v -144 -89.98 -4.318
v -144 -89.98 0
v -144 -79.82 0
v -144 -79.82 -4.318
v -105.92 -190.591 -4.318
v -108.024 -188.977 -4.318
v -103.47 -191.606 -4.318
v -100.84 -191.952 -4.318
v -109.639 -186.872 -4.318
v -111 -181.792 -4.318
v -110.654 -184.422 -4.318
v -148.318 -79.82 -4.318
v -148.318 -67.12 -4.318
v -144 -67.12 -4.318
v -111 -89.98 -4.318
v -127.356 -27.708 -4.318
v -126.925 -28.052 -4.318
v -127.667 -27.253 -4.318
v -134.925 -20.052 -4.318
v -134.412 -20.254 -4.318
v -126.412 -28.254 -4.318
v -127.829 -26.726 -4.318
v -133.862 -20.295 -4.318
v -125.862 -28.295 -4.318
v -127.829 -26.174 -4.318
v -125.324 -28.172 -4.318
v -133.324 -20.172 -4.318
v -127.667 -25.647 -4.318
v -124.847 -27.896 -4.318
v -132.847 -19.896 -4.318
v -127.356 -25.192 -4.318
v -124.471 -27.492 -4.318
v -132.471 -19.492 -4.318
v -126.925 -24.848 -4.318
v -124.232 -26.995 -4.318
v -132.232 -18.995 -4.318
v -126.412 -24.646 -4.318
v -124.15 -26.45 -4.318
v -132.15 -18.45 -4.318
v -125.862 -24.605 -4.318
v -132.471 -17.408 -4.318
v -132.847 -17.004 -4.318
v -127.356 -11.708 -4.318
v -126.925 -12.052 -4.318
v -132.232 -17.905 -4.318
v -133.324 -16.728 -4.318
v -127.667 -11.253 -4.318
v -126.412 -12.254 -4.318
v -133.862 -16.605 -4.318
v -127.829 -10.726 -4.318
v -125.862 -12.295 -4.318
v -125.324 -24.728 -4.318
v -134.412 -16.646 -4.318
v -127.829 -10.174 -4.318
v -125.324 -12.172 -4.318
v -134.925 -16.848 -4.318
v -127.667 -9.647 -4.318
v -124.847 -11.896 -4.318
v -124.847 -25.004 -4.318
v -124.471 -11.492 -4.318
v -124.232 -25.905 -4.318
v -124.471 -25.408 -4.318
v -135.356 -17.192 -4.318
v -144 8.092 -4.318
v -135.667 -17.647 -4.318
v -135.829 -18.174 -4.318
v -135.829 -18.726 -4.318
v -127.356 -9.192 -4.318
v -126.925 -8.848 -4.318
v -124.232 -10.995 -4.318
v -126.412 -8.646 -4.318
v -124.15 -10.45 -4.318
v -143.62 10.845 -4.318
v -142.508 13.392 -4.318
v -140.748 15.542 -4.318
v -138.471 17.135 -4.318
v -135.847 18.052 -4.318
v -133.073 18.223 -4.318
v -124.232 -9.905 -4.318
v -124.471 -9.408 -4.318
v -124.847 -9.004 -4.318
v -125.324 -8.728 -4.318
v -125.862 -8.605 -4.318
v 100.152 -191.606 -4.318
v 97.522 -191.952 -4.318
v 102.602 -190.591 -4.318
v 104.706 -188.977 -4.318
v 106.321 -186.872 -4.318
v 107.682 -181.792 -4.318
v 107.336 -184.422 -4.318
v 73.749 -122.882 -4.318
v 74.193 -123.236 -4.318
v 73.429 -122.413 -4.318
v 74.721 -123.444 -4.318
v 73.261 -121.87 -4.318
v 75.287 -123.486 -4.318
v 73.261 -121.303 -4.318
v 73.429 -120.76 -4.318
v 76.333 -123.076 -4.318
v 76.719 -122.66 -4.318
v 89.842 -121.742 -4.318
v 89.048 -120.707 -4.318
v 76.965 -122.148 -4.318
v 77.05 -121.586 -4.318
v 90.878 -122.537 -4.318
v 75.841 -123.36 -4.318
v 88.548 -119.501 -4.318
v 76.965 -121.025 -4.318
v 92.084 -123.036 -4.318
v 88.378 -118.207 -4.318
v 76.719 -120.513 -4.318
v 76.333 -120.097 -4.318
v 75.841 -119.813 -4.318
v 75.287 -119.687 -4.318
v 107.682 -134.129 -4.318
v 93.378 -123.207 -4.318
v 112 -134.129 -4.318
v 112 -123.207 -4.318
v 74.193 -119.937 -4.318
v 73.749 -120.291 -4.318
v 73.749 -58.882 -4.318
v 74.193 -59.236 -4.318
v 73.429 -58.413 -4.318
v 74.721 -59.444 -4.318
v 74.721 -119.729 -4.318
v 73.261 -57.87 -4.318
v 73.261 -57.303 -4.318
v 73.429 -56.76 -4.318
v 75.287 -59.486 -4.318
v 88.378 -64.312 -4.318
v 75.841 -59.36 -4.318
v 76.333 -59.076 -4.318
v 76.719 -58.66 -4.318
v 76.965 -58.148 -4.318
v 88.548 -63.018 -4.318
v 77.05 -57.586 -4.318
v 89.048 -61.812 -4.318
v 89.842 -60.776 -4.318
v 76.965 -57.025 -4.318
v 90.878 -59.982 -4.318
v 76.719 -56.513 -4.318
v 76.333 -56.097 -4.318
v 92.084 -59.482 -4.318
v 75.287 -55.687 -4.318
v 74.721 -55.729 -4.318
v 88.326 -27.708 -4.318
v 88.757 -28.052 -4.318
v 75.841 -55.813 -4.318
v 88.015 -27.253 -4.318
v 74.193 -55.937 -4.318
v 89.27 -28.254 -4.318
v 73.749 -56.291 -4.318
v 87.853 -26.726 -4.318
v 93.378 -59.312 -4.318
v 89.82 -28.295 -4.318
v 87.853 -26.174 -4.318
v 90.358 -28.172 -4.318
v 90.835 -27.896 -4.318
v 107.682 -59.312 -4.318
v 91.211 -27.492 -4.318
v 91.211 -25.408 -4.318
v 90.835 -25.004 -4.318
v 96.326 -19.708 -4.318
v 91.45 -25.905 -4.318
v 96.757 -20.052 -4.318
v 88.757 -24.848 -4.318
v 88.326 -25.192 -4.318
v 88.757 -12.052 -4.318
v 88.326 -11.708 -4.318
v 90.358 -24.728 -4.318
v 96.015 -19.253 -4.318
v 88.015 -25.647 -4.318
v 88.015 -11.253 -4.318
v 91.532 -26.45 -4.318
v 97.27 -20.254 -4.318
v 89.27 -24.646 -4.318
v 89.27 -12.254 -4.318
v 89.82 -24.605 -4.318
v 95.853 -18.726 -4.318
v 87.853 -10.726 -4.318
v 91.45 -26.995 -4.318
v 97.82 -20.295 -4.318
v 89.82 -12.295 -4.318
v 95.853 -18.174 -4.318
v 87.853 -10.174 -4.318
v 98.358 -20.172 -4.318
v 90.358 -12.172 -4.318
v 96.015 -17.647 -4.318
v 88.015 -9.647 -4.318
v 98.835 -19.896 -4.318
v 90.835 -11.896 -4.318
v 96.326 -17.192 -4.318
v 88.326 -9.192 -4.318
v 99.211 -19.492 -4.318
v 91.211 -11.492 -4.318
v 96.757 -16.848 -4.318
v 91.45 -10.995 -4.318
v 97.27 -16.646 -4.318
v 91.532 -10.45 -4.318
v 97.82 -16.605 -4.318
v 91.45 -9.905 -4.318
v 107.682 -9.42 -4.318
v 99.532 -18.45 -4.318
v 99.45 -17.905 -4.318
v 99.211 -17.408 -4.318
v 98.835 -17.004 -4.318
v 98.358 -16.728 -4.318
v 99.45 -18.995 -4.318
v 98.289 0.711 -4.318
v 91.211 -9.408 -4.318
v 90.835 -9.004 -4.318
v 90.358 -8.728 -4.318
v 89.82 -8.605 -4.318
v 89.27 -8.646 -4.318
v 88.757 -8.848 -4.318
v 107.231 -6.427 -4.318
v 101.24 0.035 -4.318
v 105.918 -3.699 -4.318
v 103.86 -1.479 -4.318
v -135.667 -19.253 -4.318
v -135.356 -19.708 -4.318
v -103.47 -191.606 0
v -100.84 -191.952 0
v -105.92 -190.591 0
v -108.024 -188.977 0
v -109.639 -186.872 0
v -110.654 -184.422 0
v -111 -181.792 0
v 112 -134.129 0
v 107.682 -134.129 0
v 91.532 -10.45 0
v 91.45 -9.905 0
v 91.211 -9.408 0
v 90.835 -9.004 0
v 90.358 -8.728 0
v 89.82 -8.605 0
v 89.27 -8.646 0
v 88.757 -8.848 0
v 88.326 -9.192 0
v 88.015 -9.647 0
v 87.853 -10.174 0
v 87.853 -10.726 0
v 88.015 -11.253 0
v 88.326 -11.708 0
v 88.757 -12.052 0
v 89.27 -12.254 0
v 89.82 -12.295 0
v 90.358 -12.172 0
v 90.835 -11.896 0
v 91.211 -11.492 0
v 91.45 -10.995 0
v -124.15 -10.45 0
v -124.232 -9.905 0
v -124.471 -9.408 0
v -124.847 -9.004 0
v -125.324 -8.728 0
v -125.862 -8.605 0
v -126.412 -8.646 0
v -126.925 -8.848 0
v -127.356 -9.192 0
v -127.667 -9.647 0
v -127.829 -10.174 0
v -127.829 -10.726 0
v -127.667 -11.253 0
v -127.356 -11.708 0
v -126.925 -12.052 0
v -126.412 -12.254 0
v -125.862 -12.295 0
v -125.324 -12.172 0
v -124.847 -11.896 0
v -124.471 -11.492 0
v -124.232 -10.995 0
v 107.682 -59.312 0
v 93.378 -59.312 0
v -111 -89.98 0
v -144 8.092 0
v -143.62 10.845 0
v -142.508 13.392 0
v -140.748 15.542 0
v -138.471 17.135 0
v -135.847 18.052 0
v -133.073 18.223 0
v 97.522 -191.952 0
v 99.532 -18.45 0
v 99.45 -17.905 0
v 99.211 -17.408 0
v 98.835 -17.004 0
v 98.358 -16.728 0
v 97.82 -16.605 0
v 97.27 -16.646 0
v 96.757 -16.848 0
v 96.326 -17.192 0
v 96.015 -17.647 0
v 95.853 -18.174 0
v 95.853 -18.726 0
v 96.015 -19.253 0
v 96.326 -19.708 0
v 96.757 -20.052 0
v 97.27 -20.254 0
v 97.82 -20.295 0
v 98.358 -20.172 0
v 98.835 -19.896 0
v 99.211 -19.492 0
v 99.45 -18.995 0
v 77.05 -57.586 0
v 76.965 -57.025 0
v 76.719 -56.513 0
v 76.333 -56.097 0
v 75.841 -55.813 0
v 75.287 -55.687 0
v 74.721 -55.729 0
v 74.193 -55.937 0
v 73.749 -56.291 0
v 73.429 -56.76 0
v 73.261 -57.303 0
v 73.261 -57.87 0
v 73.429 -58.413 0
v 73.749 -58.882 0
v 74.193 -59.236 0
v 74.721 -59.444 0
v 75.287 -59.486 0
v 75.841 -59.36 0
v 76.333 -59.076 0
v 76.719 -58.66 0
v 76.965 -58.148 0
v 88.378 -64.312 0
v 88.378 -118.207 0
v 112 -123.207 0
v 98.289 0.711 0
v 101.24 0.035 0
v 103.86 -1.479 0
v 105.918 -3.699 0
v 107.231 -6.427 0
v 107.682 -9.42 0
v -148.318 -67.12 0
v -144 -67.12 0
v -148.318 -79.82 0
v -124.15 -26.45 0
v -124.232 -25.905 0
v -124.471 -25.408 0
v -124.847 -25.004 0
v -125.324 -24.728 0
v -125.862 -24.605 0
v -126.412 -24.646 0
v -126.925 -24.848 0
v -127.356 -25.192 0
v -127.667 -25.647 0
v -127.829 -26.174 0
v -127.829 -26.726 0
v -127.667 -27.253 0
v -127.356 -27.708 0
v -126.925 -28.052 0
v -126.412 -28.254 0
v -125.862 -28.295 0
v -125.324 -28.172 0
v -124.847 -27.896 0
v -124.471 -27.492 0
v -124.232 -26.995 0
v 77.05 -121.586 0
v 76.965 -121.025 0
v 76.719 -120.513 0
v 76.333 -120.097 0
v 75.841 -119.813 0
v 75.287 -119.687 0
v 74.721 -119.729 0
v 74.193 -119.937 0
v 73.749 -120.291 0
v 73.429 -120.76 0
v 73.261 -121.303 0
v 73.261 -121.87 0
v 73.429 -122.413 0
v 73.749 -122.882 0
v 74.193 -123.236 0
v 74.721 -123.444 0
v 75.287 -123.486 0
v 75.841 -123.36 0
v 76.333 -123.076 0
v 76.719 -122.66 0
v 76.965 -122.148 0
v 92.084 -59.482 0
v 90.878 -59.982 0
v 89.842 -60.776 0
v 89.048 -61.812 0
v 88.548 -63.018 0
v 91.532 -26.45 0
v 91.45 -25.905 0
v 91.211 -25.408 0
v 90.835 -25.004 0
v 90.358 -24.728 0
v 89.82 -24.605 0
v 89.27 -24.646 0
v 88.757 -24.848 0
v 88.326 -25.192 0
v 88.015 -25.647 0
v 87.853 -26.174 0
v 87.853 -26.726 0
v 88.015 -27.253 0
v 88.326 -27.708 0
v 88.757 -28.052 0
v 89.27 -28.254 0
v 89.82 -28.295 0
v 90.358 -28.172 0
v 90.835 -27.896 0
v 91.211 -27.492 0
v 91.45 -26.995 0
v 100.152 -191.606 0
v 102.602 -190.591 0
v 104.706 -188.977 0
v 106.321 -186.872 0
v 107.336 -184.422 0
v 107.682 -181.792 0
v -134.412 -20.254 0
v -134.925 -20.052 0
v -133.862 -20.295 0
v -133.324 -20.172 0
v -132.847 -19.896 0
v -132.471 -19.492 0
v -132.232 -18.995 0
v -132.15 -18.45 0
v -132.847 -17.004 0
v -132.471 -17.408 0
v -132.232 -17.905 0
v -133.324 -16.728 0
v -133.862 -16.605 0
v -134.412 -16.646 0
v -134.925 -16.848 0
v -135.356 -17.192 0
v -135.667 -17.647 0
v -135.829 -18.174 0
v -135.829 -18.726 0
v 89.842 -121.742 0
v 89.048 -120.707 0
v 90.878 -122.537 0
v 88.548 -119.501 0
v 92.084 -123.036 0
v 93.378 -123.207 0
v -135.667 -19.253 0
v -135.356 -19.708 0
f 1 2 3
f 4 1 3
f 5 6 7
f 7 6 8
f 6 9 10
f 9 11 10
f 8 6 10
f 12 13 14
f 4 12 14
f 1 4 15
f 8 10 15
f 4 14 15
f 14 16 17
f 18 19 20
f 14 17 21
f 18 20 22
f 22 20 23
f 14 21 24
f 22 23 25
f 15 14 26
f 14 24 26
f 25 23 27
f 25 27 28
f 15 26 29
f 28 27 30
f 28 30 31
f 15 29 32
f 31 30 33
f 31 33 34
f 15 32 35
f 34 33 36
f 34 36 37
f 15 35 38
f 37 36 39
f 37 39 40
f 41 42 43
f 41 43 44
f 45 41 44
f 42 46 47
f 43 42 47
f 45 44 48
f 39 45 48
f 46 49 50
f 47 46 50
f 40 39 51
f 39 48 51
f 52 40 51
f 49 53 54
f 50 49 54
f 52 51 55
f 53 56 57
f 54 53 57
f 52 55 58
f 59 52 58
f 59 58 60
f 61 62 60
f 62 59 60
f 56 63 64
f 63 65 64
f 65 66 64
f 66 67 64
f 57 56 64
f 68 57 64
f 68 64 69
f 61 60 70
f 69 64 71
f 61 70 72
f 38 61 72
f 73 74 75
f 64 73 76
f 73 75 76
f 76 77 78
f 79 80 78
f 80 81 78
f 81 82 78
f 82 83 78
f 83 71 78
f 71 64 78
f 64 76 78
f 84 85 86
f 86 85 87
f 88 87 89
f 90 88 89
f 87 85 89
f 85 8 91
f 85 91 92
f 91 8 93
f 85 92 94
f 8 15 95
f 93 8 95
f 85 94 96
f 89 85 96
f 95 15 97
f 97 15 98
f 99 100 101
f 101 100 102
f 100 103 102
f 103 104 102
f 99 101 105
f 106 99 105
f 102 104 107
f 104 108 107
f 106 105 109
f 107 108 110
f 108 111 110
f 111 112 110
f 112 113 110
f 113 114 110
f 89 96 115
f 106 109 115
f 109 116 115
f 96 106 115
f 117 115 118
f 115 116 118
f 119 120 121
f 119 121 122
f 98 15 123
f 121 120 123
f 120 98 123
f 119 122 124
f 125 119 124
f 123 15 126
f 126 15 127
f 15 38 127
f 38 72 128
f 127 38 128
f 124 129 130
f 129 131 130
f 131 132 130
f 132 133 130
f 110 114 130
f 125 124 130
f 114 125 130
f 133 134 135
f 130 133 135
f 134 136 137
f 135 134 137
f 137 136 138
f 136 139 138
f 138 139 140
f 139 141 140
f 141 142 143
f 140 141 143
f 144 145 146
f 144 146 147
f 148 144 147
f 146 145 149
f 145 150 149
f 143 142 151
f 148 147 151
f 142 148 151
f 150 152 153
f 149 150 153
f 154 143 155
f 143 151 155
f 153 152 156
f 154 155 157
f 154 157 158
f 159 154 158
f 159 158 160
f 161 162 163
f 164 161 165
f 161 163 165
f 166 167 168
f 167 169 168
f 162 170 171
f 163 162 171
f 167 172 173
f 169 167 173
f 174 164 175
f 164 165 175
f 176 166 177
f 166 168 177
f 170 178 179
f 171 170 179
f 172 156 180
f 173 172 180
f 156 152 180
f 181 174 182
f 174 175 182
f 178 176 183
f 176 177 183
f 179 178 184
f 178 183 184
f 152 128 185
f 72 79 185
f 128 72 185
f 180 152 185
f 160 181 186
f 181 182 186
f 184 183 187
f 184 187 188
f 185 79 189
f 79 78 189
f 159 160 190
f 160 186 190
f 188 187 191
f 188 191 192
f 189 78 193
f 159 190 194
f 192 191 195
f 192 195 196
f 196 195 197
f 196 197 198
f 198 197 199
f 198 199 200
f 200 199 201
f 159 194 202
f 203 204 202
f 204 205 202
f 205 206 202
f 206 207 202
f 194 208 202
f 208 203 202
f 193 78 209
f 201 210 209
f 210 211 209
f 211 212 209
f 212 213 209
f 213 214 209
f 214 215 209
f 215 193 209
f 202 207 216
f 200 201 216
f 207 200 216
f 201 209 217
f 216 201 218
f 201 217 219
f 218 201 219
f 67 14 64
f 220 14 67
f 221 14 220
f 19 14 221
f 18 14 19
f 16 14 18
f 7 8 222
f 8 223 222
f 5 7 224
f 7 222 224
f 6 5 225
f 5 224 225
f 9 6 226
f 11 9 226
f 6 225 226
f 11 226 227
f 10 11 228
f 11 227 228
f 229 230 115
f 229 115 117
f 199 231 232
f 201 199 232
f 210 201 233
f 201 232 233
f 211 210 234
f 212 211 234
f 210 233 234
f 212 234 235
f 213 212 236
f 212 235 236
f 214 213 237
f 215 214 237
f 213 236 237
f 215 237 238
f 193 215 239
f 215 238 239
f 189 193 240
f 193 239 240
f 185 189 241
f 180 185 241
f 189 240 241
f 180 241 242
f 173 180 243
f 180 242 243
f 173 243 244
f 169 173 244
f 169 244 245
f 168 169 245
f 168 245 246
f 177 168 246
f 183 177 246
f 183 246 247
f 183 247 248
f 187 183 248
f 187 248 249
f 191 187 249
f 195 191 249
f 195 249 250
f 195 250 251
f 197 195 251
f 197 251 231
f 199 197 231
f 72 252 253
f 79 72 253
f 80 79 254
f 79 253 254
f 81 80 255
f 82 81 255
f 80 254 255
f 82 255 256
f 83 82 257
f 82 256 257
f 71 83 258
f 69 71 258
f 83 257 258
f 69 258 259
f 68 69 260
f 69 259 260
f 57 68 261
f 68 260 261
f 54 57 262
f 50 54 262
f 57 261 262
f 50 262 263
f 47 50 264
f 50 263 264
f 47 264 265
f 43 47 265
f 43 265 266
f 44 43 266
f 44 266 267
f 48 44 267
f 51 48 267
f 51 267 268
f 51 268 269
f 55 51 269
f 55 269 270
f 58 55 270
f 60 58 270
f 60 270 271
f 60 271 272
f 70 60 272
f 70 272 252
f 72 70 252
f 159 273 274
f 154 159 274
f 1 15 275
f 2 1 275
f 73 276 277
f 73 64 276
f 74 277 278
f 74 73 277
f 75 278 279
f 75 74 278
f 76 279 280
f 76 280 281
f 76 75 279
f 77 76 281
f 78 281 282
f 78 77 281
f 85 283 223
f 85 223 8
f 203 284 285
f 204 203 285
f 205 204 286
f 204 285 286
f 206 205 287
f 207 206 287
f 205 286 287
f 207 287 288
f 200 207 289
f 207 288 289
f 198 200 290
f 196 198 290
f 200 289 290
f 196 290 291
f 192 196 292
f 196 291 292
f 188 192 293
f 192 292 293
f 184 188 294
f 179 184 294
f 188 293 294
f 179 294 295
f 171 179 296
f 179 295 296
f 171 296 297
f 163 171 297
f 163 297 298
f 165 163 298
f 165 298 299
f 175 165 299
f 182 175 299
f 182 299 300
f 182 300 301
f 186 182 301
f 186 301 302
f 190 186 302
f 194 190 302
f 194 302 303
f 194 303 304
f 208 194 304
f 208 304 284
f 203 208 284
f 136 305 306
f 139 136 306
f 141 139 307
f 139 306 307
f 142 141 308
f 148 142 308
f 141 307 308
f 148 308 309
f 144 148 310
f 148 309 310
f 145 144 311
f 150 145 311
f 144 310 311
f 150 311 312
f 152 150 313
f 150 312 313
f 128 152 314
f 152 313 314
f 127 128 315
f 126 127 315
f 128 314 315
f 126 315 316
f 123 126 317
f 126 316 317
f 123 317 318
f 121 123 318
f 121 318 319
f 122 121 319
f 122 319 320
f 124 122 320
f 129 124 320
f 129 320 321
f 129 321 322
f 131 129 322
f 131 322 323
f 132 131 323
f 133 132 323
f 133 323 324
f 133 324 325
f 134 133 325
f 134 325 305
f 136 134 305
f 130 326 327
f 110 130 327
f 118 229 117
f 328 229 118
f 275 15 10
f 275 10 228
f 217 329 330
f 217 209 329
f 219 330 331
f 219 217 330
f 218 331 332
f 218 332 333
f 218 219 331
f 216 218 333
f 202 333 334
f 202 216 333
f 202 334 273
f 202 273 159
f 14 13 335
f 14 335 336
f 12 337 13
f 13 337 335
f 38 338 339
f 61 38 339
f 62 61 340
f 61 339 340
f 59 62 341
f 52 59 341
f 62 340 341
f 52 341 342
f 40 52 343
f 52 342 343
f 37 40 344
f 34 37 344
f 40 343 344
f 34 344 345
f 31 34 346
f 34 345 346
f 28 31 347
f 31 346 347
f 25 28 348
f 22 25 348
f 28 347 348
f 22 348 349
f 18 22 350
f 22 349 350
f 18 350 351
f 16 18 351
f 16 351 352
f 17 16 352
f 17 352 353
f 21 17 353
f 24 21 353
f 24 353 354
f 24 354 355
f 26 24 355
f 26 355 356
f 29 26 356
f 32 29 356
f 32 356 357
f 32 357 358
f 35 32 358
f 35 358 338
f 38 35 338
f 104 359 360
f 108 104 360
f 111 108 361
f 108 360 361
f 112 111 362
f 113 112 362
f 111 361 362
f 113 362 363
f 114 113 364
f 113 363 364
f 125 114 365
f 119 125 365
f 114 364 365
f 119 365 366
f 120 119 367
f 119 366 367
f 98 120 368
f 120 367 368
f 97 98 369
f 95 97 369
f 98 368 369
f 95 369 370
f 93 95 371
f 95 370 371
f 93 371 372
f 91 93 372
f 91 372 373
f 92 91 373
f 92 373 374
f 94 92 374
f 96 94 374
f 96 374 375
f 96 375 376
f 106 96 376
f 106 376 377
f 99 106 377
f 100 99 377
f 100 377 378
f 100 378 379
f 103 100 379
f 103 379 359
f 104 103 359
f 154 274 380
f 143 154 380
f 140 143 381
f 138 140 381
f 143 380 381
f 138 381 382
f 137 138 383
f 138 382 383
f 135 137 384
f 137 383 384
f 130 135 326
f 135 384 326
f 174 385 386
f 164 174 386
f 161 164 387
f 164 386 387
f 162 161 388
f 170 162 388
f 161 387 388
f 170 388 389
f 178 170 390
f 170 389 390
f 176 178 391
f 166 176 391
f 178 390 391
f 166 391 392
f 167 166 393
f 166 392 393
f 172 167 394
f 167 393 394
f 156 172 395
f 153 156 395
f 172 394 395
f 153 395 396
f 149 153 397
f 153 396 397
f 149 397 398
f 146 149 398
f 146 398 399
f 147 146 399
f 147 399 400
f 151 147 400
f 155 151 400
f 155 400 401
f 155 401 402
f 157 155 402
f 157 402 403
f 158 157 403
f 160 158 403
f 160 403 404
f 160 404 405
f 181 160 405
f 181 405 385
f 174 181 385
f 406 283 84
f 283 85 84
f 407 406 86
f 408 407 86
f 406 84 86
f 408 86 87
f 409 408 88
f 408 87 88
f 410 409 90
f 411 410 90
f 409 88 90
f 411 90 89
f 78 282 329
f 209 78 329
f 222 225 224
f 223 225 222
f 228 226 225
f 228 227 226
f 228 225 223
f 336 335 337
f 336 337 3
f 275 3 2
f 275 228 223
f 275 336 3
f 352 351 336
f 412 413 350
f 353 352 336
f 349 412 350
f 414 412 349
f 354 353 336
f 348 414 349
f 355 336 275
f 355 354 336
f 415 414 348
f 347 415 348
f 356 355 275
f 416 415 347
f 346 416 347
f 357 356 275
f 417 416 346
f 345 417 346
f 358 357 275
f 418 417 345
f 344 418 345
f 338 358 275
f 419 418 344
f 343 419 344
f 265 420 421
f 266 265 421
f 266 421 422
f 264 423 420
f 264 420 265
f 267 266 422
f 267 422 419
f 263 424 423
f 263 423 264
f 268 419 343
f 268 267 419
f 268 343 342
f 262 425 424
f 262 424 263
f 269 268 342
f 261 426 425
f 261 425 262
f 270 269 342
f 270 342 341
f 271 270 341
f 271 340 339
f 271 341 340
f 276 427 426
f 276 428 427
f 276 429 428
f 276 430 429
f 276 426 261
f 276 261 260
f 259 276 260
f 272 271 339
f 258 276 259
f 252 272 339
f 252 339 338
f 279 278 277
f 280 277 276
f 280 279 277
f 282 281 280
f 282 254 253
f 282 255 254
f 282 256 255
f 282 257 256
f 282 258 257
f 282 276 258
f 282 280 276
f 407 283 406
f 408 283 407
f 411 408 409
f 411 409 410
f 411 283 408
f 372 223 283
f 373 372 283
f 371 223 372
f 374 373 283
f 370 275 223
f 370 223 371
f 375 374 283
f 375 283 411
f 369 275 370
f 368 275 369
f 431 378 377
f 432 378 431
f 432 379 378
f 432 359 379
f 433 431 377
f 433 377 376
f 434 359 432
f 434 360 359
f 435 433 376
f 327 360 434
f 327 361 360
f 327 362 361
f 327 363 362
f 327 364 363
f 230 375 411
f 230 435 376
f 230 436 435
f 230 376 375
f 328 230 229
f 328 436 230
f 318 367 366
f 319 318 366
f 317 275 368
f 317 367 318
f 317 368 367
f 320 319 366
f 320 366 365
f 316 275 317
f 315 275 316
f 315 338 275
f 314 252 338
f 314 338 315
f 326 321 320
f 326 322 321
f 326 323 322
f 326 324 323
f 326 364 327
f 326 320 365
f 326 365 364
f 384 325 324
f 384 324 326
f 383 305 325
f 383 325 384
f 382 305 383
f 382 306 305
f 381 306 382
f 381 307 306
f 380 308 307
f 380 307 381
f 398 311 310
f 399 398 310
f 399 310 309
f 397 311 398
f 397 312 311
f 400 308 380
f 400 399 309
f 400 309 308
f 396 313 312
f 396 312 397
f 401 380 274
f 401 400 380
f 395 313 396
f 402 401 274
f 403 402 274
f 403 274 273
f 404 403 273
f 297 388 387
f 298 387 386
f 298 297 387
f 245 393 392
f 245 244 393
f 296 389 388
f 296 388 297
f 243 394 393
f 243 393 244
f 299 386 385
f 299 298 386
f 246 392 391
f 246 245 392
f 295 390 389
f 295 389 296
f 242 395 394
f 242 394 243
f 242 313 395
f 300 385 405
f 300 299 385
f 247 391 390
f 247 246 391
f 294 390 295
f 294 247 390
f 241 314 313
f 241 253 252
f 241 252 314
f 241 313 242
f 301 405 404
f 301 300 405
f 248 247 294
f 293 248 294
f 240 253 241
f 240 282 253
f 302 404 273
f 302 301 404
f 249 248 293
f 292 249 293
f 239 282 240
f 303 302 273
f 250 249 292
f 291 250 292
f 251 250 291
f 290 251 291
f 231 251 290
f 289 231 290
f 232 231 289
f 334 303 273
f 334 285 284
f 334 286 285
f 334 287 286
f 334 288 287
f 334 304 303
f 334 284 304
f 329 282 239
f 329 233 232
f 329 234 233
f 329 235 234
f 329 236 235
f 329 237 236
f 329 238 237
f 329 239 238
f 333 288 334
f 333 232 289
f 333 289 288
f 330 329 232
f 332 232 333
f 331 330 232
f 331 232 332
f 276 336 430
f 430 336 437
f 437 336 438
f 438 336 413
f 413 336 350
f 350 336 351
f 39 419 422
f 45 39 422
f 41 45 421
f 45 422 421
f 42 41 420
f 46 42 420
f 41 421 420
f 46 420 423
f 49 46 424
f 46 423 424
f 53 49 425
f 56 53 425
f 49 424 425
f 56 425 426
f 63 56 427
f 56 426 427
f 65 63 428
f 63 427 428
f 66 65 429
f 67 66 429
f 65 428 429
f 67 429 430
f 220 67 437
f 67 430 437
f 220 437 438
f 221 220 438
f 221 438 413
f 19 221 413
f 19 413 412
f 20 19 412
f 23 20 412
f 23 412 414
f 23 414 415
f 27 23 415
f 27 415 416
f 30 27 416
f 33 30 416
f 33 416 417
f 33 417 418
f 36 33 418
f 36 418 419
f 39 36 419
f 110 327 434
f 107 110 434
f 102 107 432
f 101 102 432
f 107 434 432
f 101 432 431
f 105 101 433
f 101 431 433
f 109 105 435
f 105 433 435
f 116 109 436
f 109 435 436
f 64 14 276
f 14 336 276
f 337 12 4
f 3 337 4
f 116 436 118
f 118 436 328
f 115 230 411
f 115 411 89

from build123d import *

# Parameters (mm, degrees)
SKETCH4_W                = 4.318
SKETCH4_H                = 191.952333584
BOSS_EXTRUDE1_DEPTH      = 107.682
BOSS_EXTRUDE1_DEPTH_BACK = 144
SKETCH5_R                = 1.905
CUT_EXTRUDE1_DEPTH       = 5.318
SKETCH6_W                = 4.318
SKETCH6_H                = 101.972648506
CUT_EXTRUDE2_DEPTH       = 33
BOSS_EXTRUDE2_DEPTH      = 4.318
SKETCH8_R                = 1.85
CUT_EXTRUDE3_DEPTH       = 5.08
SKETCH9_W                = 4.318
SKETCH9_H                = 10.922
SKETCH9_H_2              = 12.7
BOSS_EXTRUDE3_DEPTH      = 4.318
FILLET2_R                = 10.16


with BuildPart() as part:
    # Sketch4 → Boss-Extrude1 (new body, two sides)
    with BuildSketch(Plane(origin=(0, 0, 0), x_dir=(0, 0, -1), z_dir=(1, 0, 0))) as boss_extrude1_sk:
        with Locations((2.159, -95.976166792)):
            Rectangle(SKETCH4_W, SKETCH4_H)
    extrude(amount=BOSS_EXTRUDE1_DEPTH)
    extrude(boss_extrude1_sk.sketch, amount=-BOSS_EXTRUDE1_DEPTH_BACK)

    # Sketch5 → Cut-Extrude1 (cut, through all)
    with BuildSketch(Plane.XY):
        with Locations((75.14500419, -57.586498411)):
            Circle(SKETCH5_R)
        with Locations((75.14500419, -121.586498411)):
            Circle(SKETCH5_R)
    extrude(amount=-CUT_EXTRUDE1_DEPTH, mode=Mode.SUBTRACT)

    # Sketch6 → Cut-Extrude2 (cut)
    with BuildSketch(Plane.ZY.offset(144)):
        with Locations((-2.159, -140.966009331)):
            Rectangle(SKETCH6_W, SKETCH6_H)
    extrude(amount=-CUT_EXTRUDE2_DEPTH, mode=Mode.SUBTRACT)

    # Sketch7 → Boss-Extrude2 (add)
    with BuildSketch(Plane.XY):
        Polygon((107.682, 0), (-144, 0), (-144, 19.05), align=None)
    extrude(amount=-BOSS_EXTRUDE2_DEPTH)

    # Sketch8 → Cut-Extrude3 (cut)
    with BuildSketch(Plane.XY):
        with Locations((75.14500419, -57.586498411)):
            Circle(SKETCH8_R)
        with Locations((75.14500419, -121.586498411)):
            Circle(SKETCH8_R)
        with Locations((89.682, -10.45)):
            Circle(SKETCH8_R)
        with Locations((97.682, -18.45)):
            Circle(SKETCH8_R)
        with Locations((89.682, -26.45)):
            Circle(SKETCH8_R)
        with Locations((-126, -26.45)):
            Circle(SKETCH8_R)
        with Locations((-126, -10.45)):
            Circle(SKETCH8_R)
        with Locations((-134, -18.45)):
            Circle(SKETCH8_R)
        with BuildLine():
            Line((107.682, -59.311924602), (93.378, -59.311924602))
            ThreePointArc((93.378, -59.311924602), (89.842466094, -60.776390696), (88.378, -64.311924602))
            Line((88.378, -64.311924602), (88.378, -118.206741276))
            ThreePointArc((88.378, -118.206741276), (89.842466094, -121.742275182), (93.378, -123.206741276))
            Line((93.378, -123.206741276), (107.682, -123.206741276))
            Line((107.682, -123.206741276), (107.682, -59.311924602))
        make_face()
    extrude(amount=-CUT_EXTRUDE3_DEPTH, mode=Mode.SUBTRACT)

    # Sketch9 → Boss-Extrude3 (add)
    with BuildSketch(Plane.XY):
        with Locations((109.841, -128.667741276)):
            Rectangle(SKETCH9_W, SKETCH9_H)
        with Locations((-146.159, -73.469685078)):
            Rectangle(SKETCH9_W, SKETCH9_H_2)
    extrude(amount=-BOSS_EXTRUDE3_DEPTH)

    # Fillet2
    fillet2_edges = [part.edges().sort_by_distance(p)[0] for p in [
        (107.682, 0, -2.159),
        (-111, -191.952333584, -2.159),
        (107.682, -191.952333584, -2.159),
        (-144, 19.05, -2.159),
    ]]
    fillet(fillet2_edges, radius=FILLET2_R)


solid = part.part
